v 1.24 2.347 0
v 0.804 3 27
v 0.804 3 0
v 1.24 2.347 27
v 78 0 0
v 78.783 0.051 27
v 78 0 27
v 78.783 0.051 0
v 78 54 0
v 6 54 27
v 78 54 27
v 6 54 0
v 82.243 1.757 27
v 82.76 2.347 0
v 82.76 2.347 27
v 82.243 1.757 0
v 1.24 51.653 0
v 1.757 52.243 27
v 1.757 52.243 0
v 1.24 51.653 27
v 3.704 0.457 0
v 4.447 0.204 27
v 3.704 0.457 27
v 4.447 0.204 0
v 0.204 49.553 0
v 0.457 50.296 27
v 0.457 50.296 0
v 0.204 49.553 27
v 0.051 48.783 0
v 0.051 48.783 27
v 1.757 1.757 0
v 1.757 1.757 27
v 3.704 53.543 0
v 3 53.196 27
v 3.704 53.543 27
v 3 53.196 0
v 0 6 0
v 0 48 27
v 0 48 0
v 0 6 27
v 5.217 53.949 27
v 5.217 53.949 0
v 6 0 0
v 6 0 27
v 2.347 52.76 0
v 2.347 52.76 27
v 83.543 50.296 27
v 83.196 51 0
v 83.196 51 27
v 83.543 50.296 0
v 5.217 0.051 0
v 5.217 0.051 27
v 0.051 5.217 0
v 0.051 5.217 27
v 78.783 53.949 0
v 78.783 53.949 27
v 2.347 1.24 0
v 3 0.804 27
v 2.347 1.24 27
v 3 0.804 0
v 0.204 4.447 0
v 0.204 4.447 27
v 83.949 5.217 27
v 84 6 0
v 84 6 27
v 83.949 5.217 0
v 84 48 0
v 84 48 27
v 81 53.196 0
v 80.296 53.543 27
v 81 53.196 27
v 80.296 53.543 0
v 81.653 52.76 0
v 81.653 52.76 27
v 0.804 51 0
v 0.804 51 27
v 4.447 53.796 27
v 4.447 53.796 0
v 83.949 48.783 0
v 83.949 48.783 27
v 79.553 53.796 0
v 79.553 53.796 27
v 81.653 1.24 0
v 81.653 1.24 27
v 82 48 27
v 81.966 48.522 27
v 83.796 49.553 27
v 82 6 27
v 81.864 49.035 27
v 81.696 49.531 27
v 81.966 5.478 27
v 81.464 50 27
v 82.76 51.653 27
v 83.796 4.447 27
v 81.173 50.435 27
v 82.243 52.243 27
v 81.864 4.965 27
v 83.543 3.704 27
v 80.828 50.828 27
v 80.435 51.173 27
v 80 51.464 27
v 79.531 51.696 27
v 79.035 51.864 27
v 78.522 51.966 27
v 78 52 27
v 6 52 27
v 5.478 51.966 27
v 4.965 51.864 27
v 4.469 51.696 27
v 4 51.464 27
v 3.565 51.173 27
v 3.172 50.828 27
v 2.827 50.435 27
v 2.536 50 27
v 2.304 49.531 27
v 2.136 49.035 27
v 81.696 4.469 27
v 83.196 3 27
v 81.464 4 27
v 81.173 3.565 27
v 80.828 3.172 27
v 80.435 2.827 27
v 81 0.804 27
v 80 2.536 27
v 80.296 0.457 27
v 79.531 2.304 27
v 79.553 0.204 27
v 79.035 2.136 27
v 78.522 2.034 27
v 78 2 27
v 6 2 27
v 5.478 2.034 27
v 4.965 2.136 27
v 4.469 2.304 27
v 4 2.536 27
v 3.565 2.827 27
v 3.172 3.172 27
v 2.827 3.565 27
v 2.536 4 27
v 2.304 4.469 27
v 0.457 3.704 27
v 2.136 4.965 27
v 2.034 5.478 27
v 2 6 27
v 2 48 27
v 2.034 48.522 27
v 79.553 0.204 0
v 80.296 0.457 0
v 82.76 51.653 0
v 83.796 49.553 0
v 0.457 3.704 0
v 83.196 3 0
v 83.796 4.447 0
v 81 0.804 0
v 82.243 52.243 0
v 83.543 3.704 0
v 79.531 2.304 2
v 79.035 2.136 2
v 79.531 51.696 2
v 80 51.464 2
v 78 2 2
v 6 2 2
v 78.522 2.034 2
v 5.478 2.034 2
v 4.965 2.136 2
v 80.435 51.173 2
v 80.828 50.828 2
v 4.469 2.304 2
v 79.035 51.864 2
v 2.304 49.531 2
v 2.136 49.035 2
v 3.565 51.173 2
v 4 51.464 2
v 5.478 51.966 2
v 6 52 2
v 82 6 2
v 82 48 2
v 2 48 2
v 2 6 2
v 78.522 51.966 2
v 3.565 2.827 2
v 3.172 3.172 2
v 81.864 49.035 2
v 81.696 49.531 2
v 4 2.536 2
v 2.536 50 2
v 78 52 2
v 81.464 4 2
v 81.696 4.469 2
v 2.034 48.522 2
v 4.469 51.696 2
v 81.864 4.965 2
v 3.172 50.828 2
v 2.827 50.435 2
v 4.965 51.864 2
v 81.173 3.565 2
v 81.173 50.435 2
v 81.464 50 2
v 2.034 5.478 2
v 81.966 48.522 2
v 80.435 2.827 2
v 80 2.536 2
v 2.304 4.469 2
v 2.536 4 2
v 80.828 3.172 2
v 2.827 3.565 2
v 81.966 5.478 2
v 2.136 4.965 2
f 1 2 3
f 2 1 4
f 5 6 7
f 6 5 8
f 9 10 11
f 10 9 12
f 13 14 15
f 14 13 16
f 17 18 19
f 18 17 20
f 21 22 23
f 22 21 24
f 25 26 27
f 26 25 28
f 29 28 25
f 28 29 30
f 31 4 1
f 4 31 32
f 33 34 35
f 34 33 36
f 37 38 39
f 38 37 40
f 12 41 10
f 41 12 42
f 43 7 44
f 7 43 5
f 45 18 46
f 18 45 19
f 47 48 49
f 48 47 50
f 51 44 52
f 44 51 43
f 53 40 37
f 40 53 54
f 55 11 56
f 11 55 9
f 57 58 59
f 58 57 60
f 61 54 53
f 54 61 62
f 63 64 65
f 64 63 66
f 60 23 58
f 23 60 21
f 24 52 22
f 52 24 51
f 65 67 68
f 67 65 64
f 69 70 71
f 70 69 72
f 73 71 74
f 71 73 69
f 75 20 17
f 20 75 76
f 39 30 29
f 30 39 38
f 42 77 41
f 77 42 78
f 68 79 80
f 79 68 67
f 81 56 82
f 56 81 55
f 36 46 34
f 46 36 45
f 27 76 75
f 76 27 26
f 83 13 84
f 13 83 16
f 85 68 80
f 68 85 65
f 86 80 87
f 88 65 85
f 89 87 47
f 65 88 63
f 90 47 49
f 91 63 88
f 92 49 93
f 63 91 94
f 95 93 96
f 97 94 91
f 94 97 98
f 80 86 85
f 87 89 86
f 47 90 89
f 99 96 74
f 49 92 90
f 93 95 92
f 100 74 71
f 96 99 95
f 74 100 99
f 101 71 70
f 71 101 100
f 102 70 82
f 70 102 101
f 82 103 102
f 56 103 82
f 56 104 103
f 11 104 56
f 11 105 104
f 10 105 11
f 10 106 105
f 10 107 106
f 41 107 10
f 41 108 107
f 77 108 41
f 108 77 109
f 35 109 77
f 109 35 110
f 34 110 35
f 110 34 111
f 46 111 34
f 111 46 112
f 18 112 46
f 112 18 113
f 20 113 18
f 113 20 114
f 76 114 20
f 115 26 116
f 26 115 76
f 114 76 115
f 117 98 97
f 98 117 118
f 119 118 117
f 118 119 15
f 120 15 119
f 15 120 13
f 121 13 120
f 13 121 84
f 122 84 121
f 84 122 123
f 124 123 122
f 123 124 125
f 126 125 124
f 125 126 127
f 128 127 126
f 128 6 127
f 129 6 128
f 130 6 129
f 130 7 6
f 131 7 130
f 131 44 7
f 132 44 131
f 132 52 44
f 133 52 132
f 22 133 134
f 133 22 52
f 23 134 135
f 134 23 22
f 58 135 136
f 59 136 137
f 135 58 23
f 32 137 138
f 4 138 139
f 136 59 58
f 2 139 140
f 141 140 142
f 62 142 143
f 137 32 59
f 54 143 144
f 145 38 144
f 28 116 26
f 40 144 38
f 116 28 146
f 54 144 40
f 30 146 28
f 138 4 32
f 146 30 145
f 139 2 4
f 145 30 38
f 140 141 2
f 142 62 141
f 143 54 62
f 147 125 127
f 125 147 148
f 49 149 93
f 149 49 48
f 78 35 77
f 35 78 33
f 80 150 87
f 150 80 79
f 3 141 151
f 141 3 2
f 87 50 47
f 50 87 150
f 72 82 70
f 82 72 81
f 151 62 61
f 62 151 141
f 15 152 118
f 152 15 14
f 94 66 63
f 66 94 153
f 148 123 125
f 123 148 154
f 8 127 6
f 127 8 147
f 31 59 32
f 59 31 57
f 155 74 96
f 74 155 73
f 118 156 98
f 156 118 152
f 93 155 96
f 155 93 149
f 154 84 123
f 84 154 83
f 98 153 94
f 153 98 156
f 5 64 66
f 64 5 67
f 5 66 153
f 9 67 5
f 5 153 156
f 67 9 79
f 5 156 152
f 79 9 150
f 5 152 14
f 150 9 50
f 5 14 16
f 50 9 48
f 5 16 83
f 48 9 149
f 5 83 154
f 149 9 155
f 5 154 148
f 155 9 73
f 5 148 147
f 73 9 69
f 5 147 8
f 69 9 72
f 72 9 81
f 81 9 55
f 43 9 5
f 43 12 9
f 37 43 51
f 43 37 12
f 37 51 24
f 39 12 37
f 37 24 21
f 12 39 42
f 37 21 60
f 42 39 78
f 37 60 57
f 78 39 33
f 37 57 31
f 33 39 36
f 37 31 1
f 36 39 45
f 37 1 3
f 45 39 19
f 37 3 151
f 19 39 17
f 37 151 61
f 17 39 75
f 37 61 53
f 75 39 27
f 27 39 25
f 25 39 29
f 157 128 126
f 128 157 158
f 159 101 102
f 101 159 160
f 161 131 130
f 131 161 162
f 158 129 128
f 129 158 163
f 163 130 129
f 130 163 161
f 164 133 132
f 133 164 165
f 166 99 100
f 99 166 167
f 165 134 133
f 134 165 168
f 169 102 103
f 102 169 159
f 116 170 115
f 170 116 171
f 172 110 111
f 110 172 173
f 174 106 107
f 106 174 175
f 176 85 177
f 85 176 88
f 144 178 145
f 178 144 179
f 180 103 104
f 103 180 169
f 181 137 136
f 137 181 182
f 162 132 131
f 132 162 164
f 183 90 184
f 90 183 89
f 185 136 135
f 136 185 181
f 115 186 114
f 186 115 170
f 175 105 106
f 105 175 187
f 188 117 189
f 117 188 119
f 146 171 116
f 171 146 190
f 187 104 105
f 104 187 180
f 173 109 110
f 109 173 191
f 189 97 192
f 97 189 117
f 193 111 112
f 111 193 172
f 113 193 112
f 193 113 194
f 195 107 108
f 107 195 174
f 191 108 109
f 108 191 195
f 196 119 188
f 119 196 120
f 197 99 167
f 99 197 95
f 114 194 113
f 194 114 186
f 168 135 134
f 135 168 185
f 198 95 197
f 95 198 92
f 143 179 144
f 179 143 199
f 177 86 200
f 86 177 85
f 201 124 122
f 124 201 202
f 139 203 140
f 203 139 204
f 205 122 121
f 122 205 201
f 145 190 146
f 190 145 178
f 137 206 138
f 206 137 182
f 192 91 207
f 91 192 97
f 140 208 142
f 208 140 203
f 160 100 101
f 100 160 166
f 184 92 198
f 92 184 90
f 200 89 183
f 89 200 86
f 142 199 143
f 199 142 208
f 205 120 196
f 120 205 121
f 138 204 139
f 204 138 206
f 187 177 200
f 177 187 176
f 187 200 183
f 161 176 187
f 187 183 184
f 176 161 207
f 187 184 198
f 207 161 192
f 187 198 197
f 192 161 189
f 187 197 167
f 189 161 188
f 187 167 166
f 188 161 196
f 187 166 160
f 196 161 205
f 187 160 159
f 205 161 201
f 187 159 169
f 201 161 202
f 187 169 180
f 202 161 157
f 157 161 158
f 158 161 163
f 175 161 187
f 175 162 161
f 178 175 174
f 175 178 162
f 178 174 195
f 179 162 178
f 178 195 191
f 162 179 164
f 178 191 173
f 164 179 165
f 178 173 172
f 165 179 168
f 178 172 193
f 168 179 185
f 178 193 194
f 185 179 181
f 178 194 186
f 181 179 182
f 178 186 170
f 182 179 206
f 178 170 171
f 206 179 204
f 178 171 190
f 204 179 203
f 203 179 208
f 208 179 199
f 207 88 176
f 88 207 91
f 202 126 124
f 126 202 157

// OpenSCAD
// Forge catalog: open tray / bin with rounded corners
inner_l = 80;   // inner length (mm)
inner_w = 50;   // inner width (mm)
inner_h = 25;   // inner height (mm)
wall    = 2;    // wall thickness (mm)
floor_t = 2;    // floor thickness (mm)
radius  = 6;    // corner radius (mm)
$fn = 48;

module rbox(l, w, h, r) {
    linear_extrude(height = h) offset(r = r) offset(delta = -r) square([l, w]);
}
difference() {
    rbox(inner_l + 2*wall, inner_w + 2*wall, inner_h + floor_t, radius);
    translate([wall, wall, floor_t]) rbox(inner_l, inner_w, inner_h + 1, max(radius - wall, 0.5));
}
